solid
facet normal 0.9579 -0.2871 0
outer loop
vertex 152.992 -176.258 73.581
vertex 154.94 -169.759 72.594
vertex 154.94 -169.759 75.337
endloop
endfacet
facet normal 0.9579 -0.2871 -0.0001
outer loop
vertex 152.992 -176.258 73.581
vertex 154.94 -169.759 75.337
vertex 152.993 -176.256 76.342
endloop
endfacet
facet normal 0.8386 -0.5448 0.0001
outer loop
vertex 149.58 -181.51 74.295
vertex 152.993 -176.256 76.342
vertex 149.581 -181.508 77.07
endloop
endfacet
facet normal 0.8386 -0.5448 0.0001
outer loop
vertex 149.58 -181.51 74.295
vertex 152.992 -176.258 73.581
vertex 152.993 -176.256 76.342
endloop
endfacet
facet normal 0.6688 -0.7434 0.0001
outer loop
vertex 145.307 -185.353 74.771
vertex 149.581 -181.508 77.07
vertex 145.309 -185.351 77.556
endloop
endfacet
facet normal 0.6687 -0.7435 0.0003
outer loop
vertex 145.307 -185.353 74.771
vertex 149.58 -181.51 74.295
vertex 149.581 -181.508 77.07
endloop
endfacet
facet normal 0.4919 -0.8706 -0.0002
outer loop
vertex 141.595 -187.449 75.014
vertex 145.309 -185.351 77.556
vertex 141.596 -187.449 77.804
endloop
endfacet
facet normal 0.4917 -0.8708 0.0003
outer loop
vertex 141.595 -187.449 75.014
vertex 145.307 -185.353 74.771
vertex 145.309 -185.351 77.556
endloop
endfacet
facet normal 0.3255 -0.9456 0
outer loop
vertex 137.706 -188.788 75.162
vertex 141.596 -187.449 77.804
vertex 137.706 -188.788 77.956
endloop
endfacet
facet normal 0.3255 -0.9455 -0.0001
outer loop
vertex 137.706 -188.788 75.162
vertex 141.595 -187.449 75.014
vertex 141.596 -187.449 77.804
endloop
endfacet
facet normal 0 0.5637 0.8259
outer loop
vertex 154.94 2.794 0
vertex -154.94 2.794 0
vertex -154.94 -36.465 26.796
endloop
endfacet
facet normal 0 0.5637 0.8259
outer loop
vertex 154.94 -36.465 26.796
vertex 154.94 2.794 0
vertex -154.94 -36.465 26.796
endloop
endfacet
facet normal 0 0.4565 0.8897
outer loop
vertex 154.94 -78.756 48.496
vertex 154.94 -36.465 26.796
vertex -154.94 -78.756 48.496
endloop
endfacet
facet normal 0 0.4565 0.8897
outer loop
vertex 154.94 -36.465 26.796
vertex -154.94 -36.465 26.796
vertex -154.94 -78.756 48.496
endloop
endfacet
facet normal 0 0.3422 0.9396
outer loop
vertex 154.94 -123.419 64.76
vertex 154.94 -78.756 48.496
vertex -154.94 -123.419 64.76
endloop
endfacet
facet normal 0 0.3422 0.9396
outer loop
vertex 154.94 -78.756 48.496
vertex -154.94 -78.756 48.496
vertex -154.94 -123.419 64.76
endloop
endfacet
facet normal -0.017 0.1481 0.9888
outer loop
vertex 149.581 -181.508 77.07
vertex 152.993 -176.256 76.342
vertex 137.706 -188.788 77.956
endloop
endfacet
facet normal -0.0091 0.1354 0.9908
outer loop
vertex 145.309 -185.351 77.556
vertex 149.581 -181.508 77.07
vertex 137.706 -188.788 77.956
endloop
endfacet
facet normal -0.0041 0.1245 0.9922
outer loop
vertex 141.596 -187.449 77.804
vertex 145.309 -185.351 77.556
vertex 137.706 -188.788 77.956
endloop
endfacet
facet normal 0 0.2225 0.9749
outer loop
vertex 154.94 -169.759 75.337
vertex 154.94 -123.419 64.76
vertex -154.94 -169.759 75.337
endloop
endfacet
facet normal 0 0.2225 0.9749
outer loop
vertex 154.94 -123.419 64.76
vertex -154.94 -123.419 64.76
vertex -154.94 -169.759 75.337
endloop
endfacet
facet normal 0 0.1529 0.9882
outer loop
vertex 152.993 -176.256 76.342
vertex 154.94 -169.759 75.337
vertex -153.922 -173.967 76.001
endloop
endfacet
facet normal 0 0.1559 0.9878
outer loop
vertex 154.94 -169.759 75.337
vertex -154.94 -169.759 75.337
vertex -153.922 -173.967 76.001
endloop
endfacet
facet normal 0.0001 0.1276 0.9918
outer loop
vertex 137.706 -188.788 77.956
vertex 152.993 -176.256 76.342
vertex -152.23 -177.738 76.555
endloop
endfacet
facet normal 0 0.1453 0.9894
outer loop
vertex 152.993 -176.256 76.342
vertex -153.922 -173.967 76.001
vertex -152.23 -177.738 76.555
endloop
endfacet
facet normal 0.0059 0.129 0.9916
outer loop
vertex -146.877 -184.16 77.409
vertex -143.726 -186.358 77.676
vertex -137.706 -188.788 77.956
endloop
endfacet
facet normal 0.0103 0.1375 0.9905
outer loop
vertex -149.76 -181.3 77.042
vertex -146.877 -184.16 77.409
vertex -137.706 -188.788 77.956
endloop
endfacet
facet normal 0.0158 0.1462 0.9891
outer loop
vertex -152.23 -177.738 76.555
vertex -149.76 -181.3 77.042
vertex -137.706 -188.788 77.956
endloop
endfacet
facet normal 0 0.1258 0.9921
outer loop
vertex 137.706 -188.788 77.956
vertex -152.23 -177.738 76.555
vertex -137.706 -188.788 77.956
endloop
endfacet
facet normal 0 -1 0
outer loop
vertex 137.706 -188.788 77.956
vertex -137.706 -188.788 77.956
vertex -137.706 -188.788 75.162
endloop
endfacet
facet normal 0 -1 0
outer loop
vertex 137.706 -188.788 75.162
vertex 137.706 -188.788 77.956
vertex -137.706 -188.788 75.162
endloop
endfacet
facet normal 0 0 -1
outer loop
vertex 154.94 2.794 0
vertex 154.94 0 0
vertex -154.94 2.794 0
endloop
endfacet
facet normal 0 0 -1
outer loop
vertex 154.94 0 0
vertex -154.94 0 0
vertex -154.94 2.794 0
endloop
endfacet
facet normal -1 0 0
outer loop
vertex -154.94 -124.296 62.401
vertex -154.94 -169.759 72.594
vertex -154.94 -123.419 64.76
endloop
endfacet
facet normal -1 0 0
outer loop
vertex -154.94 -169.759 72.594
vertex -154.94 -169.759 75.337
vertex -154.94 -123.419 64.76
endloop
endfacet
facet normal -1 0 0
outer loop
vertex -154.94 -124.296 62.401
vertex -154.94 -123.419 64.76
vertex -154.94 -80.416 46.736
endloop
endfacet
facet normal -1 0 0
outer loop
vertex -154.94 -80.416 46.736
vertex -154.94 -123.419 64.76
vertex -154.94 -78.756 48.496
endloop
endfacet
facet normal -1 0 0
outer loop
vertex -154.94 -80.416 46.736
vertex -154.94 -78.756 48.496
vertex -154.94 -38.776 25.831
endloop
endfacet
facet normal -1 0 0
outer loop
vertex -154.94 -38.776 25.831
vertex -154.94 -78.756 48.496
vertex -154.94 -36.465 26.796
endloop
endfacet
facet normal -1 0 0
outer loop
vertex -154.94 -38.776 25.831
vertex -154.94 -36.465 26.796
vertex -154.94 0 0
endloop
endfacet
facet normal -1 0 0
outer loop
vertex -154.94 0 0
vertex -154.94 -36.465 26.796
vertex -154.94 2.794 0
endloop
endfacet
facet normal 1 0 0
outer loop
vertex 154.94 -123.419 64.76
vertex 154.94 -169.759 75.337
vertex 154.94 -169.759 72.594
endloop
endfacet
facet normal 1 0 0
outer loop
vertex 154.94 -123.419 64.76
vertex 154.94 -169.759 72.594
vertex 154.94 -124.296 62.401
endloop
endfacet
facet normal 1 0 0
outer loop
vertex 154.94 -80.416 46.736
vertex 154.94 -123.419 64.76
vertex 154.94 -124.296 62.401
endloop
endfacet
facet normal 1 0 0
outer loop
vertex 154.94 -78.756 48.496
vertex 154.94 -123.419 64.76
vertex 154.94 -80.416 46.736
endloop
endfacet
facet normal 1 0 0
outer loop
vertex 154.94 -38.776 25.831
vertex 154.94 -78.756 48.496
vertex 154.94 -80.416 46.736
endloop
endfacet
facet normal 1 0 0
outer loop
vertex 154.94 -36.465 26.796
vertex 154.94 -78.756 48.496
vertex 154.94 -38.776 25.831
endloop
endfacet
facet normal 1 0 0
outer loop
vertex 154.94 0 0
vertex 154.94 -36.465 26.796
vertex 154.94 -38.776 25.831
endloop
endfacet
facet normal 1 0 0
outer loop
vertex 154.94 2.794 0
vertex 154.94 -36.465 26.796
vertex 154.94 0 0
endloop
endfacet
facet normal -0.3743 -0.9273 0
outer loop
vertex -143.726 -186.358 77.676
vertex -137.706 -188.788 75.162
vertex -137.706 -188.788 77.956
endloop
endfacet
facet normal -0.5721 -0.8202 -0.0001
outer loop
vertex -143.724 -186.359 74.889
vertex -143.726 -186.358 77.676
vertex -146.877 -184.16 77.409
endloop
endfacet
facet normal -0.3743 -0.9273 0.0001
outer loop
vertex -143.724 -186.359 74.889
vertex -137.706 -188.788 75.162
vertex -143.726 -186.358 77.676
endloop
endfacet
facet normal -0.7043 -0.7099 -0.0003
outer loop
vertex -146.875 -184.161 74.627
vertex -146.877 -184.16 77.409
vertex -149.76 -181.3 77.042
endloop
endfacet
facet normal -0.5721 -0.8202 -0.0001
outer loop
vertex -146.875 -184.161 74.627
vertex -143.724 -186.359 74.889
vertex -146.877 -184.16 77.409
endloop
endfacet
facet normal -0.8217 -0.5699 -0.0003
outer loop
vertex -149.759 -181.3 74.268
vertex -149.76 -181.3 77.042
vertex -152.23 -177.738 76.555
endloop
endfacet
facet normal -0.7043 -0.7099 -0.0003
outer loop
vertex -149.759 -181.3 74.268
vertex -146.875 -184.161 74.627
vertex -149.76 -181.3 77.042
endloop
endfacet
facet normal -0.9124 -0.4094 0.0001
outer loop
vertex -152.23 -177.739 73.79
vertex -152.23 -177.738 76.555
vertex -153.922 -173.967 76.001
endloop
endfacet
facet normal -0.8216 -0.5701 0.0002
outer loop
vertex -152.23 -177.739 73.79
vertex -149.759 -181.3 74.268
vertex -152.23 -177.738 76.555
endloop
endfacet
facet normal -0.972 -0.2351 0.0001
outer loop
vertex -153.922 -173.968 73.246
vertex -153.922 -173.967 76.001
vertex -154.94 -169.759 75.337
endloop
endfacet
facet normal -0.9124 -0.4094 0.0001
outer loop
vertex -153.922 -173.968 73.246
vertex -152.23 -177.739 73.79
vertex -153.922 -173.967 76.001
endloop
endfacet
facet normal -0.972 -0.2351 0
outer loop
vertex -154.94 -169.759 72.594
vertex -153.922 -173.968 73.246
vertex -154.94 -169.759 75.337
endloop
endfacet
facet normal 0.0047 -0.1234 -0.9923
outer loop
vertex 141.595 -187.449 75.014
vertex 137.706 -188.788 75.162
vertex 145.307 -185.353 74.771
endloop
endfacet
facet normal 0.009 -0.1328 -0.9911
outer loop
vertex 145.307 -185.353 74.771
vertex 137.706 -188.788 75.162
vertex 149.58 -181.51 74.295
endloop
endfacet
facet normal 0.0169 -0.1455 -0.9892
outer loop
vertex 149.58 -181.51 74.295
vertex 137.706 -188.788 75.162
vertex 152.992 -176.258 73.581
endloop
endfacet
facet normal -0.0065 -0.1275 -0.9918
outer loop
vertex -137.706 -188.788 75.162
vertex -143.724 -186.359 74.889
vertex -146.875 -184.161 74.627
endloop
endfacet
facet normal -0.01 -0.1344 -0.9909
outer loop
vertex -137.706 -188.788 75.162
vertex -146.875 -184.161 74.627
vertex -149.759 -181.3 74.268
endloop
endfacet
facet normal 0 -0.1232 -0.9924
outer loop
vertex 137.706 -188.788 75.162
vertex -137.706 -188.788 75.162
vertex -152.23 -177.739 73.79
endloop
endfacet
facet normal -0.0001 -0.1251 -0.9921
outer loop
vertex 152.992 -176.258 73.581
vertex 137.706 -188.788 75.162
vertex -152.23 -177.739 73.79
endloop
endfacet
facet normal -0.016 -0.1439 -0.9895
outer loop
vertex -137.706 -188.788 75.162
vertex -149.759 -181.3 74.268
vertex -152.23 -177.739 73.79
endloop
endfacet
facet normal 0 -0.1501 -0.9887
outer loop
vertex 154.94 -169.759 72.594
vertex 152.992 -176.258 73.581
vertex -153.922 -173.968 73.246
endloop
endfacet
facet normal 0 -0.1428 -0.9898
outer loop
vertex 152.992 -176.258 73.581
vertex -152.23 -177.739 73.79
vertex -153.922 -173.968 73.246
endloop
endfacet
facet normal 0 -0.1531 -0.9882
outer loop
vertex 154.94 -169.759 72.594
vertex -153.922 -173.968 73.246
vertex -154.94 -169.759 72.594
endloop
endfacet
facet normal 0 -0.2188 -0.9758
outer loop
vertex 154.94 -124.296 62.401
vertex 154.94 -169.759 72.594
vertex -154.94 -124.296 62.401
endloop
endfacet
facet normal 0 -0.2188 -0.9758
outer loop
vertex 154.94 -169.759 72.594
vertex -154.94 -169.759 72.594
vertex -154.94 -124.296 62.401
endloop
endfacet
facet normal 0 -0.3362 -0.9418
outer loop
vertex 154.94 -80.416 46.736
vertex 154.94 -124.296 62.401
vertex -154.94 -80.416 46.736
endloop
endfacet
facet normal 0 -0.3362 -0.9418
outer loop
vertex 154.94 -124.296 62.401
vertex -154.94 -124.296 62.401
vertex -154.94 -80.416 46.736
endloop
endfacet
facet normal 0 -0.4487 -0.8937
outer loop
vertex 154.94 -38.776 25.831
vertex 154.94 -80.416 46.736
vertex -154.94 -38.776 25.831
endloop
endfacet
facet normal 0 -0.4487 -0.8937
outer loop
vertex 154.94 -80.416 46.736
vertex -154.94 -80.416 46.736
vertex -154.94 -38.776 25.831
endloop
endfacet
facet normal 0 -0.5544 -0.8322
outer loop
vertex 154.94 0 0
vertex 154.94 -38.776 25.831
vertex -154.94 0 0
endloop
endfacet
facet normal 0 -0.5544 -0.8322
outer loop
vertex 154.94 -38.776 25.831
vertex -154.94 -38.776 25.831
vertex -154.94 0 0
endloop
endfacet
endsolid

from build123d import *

# Parameters (mm, degrees)
F1_DEPTH      = 154.94
F1_DEPTH_BACK = 154.94
F3_DEPTH      = 186.182


with BuildPart() as f1:
    # F0 (on Right) → F1 (new body, two sides)
    with BuildSketch(Plane.YZ) as f1_sk:
        with BuildLine():
            ThreePointArc((-188.7878807099, 75.1623316368), (-89.2907214559, 50.3991008102), (0, 0))
            Line((0, 0), (2.794, 0))
            ThreePointArc((2.794, 0), (-87.6056719262, 52.227498147), (-188.7878807099, 77.9563316368))
            Line((-188.7878807099, 77.9563316368), (-188.7878807099, 75.1623316368))
        make_face()
    extrude(amount=-F1_DEPTH)
    extrude(f1_sk.sketch, amount=F1_DEPTH_BACK)

    # F2 (on Top) → F3 (cut)
    with BuildSketch(Plane.XY):
        with BuildLine():
            ThreePointArc((-126.7025372224, -188.7878807099), (-147.6240234131, -183.5115430003), (-154.94, -163.2131487131))
            Line((-154.94, -163.2131487131), (-161.3427400589, -163.2131487131))
            Line((-161.3427400589, -163.2131487131), (-161.3427400589, -196.9332418511))
            Line((-161.3427400589, -196.9332418511), (-120.7653358579, -196.9332418511))
            Line((-120.7653358579, -196.9332418511), (-126.7025372224, -188.7878807099))
        make_face()
        with BuildLine():
            Line((126.7025372224, -188.7878807099), (120.7653358579, -196.9332418511))
            Line((120.7653358579, -196.9332418511), (161.3427400589, -196.9332418511))
            Line((161.3427400589, -196.9332418511), (161.3427400589, -163.2131487131))
            Line((161.3427400589, -163.2131487131), (154.94, -163.2131487131))
            ThreePointArc((154.94, -163.2131487131), (147.6240234131, -183.5115430003), (126.7025372224, -188.7878807099))
        make_face()
    extrude(amount=F3_DEPTH, mode=Mode.SUBTRACT)


solid = f1.part
